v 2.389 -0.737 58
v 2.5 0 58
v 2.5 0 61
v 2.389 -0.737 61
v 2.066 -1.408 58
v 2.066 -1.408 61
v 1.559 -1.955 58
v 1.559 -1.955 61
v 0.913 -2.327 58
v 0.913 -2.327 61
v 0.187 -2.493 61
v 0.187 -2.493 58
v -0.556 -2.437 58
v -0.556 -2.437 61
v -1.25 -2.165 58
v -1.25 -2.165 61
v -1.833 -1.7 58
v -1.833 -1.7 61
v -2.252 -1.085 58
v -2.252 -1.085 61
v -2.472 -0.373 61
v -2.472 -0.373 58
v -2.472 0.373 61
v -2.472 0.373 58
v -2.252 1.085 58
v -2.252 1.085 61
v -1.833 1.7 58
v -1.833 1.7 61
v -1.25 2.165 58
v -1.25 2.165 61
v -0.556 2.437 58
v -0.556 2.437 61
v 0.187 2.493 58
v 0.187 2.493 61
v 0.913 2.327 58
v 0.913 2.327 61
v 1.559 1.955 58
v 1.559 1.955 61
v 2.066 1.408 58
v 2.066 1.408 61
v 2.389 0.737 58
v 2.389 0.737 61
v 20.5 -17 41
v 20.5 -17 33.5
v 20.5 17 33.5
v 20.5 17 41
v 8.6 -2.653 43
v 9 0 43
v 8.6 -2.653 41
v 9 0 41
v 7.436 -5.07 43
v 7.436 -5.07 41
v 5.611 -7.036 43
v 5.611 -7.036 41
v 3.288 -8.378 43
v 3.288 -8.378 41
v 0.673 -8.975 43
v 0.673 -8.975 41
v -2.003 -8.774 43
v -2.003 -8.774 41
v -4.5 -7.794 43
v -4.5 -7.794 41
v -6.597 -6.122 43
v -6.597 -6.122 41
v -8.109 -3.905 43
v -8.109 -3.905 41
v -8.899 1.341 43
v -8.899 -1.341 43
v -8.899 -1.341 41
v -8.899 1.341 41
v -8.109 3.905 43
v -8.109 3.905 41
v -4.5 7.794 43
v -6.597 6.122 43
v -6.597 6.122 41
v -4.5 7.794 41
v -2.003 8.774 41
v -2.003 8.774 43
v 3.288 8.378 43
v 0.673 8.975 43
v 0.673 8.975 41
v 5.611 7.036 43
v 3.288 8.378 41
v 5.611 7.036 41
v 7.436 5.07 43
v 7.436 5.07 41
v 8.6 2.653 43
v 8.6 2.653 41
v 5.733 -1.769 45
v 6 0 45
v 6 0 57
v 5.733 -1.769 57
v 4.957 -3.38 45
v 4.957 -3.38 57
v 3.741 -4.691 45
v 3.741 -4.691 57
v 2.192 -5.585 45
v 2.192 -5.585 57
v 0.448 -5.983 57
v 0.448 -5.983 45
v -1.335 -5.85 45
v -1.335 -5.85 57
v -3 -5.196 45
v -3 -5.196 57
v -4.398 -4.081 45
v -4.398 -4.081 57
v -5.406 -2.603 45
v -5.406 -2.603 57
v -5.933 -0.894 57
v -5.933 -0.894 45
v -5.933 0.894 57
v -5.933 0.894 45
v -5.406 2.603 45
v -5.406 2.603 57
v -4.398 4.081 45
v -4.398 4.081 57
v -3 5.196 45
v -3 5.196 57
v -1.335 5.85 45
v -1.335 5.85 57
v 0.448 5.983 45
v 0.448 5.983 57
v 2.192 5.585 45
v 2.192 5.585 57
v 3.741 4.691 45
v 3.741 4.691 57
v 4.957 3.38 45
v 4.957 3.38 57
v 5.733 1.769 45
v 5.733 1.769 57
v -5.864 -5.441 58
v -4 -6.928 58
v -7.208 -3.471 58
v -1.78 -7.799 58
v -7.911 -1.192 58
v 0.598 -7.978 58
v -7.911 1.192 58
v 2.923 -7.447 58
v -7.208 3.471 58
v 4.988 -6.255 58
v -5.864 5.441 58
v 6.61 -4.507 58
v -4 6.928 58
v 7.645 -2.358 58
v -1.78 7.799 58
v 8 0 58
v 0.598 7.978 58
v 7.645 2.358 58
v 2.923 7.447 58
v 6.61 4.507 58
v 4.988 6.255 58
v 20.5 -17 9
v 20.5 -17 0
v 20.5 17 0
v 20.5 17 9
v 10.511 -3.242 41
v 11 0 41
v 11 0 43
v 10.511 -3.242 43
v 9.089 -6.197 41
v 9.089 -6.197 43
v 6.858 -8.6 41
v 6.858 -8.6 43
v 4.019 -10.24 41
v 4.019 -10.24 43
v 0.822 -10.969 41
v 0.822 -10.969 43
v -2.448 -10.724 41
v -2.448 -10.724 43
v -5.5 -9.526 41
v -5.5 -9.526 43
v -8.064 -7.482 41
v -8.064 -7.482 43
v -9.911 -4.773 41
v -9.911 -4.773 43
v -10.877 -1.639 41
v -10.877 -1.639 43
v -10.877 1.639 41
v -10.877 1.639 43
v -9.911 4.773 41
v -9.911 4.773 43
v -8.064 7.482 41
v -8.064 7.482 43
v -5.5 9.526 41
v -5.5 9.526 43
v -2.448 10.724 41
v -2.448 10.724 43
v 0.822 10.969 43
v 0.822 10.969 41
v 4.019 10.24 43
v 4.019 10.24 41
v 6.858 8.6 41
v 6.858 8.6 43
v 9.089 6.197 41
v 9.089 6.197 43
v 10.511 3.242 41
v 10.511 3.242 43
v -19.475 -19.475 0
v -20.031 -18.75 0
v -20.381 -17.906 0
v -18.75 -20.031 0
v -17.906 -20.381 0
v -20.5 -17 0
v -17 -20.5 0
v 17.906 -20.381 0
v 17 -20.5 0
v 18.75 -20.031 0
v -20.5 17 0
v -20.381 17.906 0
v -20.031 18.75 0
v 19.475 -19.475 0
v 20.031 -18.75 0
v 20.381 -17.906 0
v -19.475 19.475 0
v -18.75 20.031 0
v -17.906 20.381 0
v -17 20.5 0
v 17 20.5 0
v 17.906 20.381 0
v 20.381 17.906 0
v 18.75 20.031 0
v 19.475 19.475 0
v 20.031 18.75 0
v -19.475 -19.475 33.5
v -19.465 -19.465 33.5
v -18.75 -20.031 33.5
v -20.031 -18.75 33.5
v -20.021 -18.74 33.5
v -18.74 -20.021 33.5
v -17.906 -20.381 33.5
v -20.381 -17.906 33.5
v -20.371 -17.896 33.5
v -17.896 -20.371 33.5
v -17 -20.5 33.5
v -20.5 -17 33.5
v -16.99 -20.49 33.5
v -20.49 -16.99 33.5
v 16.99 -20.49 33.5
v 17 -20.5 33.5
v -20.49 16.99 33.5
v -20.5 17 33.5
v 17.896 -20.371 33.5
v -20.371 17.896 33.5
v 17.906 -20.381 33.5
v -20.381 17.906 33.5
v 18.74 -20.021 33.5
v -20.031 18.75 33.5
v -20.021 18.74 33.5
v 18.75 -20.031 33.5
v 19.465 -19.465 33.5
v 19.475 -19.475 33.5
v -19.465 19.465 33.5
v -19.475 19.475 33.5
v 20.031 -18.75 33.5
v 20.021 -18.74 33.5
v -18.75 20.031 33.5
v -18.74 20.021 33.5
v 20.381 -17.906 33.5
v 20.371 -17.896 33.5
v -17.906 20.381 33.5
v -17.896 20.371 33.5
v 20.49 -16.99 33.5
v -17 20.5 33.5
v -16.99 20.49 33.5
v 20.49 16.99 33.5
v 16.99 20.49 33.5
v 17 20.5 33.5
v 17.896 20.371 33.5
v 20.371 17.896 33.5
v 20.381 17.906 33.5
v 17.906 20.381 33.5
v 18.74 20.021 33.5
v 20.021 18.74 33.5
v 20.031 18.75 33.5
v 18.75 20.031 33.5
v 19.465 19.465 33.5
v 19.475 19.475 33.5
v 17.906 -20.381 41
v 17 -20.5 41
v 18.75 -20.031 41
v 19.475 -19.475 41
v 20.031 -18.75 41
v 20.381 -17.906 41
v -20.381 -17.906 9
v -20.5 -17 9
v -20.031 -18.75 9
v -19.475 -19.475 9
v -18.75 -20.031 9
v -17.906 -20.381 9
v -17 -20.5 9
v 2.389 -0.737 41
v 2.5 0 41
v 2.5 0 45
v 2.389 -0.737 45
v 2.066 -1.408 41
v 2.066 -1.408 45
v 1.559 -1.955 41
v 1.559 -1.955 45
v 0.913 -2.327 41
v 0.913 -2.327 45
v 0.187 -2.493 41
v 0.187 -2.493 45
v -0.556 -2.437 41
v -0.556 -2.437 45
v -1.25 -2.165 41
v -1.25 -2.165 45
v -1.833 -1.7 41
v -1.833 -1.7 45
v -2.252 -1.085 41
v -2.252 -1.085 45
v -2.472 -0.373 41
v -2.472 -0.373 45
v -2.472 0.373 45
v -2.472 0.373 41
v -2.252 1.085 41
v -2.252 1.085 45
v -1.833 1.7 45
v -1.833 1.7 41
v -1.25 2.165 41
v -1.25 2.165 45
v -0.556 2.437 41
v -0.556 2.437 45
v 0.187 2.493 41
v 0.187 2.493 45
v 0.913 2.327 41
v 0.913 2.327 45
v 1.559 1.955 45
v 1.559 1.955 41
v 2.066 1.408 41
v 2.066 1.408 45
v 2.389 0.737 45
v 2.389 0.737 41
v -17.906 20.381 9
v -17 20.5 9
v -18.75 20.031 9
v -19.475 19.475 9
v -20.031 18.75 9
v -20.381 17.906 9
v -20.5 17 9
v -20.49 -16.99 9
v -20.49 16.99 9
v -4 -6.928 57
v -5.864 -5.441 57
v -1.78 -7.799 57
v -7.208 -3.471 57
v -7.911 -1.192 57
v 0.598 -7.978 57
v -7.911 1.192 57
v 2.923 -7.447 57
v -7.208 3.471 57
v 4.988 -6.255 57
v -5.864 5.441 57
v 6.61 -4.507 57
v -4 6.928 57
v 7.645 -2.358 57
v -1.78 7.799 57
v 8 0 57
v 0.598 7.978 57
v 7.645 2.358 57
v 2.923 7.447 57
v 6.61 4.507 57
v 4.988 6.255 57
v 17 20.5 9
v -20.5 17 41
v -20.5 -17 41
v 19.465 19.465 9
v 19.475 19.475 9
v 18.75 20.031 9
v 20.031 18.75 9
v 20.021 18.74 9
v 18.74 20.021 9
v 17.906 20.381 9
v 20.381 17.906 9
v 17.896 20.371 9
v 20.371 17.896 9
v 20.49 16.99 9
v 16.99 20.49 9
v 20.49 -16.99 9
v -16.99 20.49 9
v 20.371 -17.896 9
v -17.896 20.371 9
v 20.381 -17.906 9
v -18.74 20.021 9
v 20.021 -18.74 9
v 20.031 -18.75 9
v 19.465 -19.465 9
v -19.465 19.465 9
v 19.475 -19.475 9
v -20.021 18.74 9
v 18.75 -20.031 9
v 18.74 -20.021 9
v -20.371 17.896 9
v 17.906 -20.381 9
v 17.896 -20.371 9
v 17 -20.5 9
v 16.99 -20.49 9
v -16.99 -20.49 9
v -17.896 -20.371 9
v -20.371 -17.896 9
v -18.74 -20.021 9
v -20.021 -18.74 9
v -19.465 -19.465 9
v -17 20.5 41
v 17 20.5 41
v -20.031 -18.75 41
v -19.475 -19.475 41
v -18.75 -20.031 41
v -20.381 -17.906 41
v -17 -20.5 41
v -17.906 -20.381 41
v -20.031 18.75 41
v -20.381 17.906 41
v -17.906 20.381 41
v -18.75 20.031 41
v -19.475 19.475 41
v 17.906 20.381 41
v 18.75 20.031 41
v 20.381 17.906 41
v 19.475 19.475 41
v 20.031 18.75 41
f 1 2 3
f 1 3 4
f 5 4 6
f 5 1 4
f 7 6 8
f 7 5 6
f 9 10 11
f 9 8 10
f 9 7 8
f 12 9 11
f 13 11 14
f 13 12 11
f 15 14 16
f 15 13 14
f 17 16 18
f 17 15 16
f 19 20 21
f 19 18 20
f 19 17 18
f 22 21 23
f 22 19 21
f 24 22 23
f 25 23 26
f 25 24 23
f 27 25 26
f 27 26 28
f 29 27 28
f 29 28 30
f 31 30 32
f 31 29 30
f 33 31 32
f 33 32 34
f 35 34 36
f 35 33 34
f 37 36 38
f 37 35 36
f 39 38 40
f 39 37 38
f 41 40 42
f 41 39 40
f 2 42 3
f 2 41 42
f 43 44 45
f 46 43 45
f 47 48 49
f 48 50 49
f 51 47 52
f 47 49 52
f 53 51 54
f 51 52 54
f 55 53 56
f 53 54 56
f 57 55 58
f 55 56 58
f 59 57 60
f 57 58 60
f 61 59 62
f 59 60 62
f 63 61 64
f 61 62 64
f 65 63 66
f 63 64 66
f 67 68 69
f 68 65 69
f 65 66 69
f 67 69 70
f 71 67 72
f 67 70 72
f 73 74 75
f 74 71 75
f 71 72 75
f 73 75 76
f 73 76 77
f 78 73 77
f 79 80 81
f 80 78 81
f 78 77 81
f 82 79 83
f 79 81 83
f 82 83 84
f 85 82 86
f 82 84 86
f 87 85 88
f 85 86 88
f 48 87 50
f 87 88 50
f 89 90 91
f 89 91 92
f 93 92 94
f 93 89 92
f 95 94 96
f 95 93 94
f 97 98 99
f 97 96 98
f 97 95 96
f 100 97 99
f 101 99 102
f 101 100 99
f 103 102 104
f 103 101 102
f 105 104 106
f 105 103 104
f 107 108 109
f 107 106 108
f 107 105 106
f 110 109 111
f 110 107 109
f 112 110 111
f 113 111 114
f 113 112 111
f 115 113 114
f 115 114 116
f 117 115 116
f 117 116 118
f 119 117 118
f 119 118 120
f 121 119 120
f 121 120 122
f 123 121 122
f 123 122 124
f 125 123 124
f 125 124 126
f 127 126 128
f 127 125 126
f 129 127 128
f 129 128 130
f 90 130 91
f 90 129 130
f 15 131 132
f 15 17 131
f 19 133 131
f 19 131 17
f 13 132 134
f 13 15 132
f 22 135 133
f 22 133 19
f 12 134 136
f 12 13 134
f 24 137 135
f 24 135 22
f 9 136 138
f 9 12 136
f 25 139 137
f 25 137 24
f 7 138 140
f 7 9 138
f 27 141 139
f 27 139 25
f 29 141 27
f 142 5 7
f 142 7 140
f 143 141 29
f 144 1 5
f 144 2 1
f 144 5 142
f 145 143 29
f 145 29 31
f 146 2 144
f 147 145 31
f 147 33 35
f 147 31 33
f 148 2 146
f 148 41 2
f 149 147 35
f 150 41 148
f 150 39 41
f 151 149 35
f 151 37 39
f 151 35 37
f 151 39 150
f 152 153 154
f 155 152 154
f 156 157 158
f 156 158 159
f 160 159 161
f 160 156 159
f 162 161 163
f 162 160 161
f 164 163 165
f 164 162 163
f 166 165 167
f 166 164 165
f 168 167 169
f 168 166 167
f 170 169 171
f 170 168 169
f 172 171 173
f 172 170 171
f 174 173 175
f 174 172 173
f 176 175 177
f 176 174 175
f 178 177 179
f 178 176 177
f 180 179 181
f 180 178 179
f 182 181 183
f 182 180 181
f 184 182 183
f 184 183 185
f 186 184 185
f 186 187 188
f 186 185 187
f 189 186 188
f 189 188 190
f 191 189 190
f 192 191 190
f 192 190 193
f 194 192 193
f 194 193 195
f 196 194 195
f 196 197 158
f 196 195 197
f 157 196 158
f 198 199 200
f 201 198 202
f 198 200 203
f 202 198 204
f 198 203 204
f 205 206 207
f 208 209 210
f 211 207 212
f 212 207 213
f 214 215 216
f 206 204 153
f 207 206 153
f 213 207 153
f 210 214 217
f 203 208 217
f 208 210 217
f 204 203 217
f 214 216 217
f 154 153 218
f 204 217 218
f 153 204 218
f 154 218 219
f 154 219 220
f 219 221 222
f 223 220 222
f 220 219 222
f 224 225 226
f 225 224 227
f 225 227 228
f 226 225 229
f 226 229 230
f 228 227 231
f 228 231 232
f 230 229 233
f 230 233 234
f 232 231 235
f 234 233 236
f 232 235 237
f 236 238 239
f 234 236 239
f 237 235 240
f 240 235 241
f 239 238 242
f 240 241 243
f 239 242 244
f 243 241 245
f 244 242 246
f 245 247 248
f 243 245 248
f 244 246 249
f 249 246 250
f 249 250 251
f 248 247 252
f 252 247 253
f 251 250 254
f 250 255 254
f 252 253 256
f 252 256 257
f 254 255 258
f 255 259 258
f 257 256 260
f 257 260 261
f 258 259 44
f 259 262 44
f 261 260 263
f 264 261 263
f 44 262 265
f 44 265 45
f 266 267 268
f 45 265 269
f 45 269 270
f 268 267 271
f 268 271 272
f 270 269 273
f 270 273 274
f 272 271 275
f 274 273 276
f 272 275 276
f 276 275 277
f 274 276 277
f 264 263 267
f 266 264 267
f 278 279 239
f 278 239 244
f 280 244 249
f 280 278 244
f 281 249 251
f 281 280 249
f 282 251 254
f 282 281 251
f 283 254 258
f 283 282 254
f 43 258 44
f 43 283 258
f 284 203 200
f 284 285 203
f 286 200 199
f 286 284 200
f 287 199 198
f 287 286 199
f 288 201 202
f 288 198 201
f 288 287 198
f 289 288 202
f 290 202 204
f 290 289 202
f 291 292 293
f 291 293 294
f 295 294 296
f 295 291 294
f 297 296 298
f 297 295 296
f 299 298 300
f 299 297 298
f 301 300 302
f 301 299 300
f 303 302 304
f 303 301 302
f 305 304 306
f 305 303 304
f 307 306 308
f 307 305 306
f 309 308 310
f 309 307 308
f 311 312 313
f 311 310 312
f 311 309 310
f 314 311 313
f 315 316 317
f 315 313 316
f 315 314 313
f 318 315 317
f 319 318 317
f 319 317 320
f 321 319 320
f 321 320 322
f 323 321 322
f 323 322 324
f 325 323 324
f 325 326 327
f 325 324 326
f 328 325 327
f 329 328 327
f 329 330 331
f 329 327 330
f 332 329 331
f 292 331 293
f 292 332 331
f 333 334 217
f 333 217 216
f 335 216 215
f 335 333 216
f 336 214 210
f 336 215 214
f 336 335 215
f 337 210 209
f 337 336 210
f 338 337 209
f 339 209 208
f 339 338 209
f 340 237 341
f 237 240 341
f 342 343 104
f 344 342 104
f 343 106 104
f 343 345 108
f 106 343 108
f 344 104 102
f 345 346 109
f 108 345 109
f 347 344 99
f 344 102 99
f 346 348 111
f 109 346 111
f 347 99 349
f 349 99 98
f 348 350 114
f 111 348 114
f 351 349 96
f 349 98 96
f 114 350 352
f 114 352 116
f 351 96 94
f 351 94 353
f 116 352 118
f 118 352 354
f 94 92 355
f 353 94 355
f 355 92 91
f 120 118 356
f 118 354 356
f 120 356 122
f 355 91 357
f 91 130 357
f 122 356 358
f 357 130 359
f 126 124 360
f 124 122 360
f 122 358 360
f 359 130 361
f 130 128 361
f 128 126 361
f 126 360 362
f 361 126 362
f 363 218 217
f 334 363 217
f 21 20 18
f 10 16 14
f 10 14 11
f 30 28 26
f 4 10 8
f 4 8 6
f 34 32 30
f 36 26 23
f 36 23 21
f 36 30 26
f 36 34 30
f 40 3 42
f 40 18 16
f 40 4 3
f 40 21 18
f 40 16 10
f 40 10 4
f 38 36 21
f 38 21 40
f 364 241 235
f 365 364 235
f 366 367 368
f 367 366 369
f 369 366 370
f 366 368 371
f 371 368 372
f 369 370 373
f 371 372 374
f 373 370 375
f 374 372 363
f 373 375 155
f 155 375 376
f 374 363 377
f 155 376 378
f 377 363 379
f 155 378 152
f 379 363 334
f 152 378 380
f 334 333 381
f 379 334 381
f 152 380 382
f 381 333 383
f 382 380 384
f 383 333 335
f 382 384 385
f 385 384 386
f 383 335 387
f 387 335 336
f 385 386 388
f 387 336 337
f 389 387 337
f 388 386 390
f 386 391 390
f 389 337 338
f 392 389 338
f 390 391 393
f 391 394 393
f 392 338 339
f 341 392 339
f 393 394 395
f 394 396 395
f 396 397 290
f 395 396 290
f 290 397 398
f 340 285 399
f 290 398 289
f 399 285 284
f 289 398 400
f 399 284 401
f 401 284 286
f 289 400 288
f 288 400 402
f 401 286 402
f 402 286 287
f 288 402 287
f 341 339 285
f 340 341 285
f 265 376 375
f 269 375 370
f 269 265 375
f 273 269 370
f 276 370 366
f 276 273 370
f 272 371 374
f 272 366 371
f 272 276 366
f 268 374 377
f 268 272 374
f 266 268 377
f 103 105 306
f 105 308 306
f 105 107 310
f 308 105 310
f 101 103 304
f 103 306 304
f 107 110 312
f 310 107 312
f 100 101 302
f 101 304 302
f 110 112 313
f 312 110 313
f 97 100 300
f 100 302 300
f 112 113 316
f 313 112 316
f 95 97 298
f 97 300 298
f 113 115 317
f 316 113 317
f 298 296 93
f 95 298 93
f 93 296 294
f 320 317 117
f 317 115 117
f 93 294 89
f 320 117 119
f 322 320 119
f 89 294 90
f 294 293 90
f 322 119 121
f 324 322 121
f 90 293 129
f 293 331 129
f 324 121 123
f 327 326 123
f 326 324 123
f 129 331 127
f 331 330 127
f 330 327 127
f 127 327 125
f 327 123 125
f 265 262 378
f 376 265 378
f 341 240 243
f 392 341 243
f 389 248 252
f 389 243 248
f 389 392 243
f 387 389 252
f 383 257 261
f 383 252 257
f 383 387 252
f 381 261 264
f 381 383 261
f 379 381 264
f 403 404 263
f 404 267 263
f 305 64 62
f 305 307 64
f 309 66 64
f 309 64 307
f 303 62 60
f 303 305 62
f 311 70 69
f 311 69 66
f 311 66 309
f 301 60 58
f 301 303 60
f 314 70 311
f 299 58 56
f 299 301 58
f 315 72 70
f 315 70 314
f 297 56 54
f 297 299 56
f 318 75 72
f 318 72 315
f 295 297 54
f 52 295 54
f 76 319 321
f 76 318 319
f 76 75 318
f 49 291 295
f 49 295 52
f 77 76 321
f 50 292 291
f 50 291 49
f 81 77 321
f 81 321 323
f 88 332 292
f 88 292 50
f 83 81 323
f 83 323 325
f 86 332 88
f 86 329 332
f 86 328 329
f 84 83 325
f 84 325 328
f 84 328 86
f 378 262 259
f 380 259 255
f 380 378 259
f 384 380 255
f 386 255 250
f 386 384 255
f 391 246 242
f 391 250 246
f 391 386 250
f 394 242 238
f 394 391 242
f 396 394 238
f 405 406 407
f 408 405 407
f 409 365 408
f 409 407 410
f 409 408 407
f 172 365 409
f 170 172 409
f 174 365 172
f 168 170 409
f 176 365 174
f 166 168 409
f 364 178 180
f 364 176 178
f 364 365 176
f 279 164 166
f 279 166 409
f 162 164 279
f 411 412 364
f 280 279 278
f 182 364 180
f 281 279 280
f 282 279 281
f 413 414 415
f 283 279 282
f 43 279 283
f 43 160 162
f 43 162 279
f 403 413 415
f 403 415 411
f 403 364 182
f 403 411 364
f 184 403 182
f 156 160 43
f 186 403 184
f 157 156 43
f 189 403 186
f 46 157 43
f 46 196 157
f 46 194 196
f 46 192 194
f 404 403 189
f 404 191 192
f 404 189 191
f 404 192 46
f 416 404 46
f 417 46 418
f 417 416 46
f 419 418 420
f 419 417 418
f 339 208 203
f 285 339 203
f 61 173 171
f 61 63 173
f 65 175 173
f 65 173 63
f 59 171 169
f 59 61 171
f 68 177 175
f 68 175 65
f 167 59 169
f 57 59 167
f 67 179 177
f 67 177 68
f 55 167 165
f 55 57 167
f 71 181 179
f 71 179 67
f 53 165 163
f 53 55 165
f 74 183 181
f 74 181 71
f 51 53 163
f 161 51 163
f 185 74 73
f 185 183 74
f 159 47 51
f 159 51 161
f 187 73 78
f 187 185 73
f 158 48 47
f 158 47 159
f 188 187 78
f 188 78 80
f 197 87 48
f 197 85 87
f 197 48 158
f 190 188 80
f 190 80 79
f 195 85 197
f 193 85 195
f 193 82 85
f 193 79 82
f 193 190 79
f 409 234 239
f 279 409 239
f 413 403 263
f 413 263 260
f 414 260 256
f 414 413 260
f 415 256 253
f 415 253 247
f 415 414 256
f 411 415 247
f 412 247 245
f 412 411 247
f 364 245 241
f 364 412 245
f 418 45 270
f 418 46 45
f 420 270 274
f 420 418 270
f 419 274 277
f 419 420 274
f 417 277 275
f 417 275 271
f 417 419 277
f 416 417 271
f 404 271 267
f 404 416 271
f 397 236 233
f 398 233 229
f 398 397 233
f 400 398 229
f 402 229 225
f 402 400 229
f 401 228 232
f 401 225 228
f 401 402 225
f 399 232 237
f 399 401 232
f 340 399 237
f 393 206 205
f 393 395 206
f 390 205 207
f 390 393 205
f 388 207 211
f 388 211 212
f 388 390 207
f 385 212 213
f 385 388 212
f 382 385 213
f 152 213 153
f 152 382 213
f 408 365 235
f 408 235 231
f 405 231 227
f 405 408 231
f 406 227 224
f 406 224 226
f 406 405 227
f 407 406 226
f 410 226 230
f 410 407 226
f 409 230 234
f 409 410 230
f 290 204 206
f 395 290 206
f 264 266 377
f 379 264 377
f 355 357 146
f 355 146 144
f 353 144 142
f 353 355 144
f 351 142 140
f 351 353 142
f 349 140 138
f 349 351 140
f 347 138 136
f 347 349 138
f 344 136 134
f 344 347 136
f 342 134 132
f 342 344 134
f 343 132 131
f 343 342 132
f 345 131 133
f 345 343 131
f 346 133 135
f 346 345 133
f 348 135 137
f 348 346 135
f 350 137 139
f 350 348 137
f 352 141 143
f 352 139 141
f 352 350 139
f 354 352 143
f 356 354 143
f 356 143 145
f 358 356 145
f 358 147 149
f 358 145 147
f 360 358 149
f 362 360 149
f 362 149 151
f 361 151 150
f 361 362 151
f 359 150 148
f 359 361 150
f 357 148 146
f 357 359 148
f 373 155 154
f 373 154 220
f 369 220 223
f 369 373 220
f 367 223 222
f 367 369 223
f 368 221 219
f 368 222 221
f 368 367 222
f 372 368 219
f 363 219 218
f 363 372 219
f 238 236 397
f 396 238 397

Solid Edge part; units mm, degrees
sketch "Sketch1" plane through (0, 0, 0) normal (0, 0, 1) x (1, 0, 0)
  line L0 (-20.5, -20.5) -> (20.5, -20.5)
  line L1 (20.5, -20.5) -> (20.5, 20.5)
  line L2 (20.5, 20.5) -> (-20.5, 20.5)
  line L3 (-20.5, 20.5) -> (-20.5, -20.5)
extrude "ProtrusiónExtruida_1" add sketch "Sketch1" along normal blind 41
sketch "Sketch2" plane through (0, 0, 41) normal (0, 0, 1) x (1, 0, 0)
  circle A0 centre (0, 0) radius 9
  circle A1 centre (0, 0) radius 11
  dimension "D1" = 2
  dimension "D2" = 22
  dimension "D3" = 5
extrude "ProtrusiónExtruida_2" add sketch "Sketch2" along normal blind 2
sketch "Sketch3" plane through (0, 0, 41) normal (0, 0, 1) x (1, 0, 0)
  circle A0 centre (0, 0) radius 2.5
extrude "ProtrusiónExtruida_3" add sketch "Sketch3" along normal blind 20
sketch "Sketch4" plane through (0, 0, 0) normal (0, -1, 0) x (1, 0, 0)
  line L0 (2.5, 58) -> (8, 58)
  line L1 (8, 58) -> (8, 57)
  line L2 (8, 57) -> (6, 57)
  line L3 (6, 57) -> (6, 45)
  line L4 (6, 45) -> (2.5, 45)
  line L5 (2.5, 45) -> (2.5, 58)
revolve "RevolvedProtrusion1" add sketch "Sketch4" angle 360 about axis through (0, 0, -54) along (0, 0, 1)
sketch "Sketch5" plane through (20.5, 0, 20.5) normal (1, 0, 0) x (0, 1, 0)
  line L0 (20.5, -11.5) -> (20.5, 13)
  line L1 (20.5, 13) -> (20.49, 13)
  line L2 (20.49, 13) -> (20.49, -11.5)
  line L3 (20.49, -11.5) -> (20.5, -11.5)
extrude "Cutout1" cut sketch "Sketch5" against normal up to next
sketch "Sketch6" plane through (0, 20.49, 21.25) normal (0, 1, 0) x (-1, 0, 0)
  line L0 (20.5, 12.25) -> (20.5, -12.25)
  line L1 (20.49, -12.25) -> (20.5, -12.25)
  line L2 (20.49, 12.25) -> (20.49, -12.25)
  line L3 (20.5, 12.25) -> (20.49, 12.25)
extrude "Cutout2" cut sketch "Sketch6" against normal up to next
sketch "Sketch7" plane through (-20.49, -0.005, 21.25) normal (-1, 0, 0) x (0, -1, 0)
  line L0 (20.485, 12.25) -> (20.485, -12.25)
  line L1 (20.485, -12.25) -> (20.495, -12.25)
  line L2 (20.495, -12.25) -> (20.495, 12.25)
  line L3 (20.495, 12.25) -> (20.485, 12.25)
extrude "Cutout3" cut sketch "Sketch7" against normal up to next
sketch "Sketch8" plane through (0.005, -20.49, 21.25) normal (0, -1, 0) x (1, 0, 0)
  line L0 (20.485, 12.25) -> (20.485, -12.25)
  line L1 (20.485, -12.25) -> (20.495, -12.25)
  line L2 (20.495, 12.25) -> (20.495, -12.25)
  line L3 (20.495, 12.25) -> (20.485, 12.25)
extrude "Cutout4" cut sketch "Sketch8" against normal up to next
fillet "Redondeo_1" [suppressed]
fillet "Redondeo_2" radius 3.5 4 edges at (20.49, -20.49, 21.25) (-20.49, -20.49, 21.25) (20.49, 20.49, 21.25) (-20.49, 20.49, 21.25)
fillet "Redondeo_3" radius 3.5 8 edges at (-20.5, 20.5, 37.25) (-20.5, -20.5, 37.25) (-20.5, 20.5, 4.5) (-20.5, -20.5, 4.5) (20.5, -20.5, 4.5) (20.5, -20.5, 37.25) (20.5, 20.5, 37.25) (20.5, 20.5, 4.5)
